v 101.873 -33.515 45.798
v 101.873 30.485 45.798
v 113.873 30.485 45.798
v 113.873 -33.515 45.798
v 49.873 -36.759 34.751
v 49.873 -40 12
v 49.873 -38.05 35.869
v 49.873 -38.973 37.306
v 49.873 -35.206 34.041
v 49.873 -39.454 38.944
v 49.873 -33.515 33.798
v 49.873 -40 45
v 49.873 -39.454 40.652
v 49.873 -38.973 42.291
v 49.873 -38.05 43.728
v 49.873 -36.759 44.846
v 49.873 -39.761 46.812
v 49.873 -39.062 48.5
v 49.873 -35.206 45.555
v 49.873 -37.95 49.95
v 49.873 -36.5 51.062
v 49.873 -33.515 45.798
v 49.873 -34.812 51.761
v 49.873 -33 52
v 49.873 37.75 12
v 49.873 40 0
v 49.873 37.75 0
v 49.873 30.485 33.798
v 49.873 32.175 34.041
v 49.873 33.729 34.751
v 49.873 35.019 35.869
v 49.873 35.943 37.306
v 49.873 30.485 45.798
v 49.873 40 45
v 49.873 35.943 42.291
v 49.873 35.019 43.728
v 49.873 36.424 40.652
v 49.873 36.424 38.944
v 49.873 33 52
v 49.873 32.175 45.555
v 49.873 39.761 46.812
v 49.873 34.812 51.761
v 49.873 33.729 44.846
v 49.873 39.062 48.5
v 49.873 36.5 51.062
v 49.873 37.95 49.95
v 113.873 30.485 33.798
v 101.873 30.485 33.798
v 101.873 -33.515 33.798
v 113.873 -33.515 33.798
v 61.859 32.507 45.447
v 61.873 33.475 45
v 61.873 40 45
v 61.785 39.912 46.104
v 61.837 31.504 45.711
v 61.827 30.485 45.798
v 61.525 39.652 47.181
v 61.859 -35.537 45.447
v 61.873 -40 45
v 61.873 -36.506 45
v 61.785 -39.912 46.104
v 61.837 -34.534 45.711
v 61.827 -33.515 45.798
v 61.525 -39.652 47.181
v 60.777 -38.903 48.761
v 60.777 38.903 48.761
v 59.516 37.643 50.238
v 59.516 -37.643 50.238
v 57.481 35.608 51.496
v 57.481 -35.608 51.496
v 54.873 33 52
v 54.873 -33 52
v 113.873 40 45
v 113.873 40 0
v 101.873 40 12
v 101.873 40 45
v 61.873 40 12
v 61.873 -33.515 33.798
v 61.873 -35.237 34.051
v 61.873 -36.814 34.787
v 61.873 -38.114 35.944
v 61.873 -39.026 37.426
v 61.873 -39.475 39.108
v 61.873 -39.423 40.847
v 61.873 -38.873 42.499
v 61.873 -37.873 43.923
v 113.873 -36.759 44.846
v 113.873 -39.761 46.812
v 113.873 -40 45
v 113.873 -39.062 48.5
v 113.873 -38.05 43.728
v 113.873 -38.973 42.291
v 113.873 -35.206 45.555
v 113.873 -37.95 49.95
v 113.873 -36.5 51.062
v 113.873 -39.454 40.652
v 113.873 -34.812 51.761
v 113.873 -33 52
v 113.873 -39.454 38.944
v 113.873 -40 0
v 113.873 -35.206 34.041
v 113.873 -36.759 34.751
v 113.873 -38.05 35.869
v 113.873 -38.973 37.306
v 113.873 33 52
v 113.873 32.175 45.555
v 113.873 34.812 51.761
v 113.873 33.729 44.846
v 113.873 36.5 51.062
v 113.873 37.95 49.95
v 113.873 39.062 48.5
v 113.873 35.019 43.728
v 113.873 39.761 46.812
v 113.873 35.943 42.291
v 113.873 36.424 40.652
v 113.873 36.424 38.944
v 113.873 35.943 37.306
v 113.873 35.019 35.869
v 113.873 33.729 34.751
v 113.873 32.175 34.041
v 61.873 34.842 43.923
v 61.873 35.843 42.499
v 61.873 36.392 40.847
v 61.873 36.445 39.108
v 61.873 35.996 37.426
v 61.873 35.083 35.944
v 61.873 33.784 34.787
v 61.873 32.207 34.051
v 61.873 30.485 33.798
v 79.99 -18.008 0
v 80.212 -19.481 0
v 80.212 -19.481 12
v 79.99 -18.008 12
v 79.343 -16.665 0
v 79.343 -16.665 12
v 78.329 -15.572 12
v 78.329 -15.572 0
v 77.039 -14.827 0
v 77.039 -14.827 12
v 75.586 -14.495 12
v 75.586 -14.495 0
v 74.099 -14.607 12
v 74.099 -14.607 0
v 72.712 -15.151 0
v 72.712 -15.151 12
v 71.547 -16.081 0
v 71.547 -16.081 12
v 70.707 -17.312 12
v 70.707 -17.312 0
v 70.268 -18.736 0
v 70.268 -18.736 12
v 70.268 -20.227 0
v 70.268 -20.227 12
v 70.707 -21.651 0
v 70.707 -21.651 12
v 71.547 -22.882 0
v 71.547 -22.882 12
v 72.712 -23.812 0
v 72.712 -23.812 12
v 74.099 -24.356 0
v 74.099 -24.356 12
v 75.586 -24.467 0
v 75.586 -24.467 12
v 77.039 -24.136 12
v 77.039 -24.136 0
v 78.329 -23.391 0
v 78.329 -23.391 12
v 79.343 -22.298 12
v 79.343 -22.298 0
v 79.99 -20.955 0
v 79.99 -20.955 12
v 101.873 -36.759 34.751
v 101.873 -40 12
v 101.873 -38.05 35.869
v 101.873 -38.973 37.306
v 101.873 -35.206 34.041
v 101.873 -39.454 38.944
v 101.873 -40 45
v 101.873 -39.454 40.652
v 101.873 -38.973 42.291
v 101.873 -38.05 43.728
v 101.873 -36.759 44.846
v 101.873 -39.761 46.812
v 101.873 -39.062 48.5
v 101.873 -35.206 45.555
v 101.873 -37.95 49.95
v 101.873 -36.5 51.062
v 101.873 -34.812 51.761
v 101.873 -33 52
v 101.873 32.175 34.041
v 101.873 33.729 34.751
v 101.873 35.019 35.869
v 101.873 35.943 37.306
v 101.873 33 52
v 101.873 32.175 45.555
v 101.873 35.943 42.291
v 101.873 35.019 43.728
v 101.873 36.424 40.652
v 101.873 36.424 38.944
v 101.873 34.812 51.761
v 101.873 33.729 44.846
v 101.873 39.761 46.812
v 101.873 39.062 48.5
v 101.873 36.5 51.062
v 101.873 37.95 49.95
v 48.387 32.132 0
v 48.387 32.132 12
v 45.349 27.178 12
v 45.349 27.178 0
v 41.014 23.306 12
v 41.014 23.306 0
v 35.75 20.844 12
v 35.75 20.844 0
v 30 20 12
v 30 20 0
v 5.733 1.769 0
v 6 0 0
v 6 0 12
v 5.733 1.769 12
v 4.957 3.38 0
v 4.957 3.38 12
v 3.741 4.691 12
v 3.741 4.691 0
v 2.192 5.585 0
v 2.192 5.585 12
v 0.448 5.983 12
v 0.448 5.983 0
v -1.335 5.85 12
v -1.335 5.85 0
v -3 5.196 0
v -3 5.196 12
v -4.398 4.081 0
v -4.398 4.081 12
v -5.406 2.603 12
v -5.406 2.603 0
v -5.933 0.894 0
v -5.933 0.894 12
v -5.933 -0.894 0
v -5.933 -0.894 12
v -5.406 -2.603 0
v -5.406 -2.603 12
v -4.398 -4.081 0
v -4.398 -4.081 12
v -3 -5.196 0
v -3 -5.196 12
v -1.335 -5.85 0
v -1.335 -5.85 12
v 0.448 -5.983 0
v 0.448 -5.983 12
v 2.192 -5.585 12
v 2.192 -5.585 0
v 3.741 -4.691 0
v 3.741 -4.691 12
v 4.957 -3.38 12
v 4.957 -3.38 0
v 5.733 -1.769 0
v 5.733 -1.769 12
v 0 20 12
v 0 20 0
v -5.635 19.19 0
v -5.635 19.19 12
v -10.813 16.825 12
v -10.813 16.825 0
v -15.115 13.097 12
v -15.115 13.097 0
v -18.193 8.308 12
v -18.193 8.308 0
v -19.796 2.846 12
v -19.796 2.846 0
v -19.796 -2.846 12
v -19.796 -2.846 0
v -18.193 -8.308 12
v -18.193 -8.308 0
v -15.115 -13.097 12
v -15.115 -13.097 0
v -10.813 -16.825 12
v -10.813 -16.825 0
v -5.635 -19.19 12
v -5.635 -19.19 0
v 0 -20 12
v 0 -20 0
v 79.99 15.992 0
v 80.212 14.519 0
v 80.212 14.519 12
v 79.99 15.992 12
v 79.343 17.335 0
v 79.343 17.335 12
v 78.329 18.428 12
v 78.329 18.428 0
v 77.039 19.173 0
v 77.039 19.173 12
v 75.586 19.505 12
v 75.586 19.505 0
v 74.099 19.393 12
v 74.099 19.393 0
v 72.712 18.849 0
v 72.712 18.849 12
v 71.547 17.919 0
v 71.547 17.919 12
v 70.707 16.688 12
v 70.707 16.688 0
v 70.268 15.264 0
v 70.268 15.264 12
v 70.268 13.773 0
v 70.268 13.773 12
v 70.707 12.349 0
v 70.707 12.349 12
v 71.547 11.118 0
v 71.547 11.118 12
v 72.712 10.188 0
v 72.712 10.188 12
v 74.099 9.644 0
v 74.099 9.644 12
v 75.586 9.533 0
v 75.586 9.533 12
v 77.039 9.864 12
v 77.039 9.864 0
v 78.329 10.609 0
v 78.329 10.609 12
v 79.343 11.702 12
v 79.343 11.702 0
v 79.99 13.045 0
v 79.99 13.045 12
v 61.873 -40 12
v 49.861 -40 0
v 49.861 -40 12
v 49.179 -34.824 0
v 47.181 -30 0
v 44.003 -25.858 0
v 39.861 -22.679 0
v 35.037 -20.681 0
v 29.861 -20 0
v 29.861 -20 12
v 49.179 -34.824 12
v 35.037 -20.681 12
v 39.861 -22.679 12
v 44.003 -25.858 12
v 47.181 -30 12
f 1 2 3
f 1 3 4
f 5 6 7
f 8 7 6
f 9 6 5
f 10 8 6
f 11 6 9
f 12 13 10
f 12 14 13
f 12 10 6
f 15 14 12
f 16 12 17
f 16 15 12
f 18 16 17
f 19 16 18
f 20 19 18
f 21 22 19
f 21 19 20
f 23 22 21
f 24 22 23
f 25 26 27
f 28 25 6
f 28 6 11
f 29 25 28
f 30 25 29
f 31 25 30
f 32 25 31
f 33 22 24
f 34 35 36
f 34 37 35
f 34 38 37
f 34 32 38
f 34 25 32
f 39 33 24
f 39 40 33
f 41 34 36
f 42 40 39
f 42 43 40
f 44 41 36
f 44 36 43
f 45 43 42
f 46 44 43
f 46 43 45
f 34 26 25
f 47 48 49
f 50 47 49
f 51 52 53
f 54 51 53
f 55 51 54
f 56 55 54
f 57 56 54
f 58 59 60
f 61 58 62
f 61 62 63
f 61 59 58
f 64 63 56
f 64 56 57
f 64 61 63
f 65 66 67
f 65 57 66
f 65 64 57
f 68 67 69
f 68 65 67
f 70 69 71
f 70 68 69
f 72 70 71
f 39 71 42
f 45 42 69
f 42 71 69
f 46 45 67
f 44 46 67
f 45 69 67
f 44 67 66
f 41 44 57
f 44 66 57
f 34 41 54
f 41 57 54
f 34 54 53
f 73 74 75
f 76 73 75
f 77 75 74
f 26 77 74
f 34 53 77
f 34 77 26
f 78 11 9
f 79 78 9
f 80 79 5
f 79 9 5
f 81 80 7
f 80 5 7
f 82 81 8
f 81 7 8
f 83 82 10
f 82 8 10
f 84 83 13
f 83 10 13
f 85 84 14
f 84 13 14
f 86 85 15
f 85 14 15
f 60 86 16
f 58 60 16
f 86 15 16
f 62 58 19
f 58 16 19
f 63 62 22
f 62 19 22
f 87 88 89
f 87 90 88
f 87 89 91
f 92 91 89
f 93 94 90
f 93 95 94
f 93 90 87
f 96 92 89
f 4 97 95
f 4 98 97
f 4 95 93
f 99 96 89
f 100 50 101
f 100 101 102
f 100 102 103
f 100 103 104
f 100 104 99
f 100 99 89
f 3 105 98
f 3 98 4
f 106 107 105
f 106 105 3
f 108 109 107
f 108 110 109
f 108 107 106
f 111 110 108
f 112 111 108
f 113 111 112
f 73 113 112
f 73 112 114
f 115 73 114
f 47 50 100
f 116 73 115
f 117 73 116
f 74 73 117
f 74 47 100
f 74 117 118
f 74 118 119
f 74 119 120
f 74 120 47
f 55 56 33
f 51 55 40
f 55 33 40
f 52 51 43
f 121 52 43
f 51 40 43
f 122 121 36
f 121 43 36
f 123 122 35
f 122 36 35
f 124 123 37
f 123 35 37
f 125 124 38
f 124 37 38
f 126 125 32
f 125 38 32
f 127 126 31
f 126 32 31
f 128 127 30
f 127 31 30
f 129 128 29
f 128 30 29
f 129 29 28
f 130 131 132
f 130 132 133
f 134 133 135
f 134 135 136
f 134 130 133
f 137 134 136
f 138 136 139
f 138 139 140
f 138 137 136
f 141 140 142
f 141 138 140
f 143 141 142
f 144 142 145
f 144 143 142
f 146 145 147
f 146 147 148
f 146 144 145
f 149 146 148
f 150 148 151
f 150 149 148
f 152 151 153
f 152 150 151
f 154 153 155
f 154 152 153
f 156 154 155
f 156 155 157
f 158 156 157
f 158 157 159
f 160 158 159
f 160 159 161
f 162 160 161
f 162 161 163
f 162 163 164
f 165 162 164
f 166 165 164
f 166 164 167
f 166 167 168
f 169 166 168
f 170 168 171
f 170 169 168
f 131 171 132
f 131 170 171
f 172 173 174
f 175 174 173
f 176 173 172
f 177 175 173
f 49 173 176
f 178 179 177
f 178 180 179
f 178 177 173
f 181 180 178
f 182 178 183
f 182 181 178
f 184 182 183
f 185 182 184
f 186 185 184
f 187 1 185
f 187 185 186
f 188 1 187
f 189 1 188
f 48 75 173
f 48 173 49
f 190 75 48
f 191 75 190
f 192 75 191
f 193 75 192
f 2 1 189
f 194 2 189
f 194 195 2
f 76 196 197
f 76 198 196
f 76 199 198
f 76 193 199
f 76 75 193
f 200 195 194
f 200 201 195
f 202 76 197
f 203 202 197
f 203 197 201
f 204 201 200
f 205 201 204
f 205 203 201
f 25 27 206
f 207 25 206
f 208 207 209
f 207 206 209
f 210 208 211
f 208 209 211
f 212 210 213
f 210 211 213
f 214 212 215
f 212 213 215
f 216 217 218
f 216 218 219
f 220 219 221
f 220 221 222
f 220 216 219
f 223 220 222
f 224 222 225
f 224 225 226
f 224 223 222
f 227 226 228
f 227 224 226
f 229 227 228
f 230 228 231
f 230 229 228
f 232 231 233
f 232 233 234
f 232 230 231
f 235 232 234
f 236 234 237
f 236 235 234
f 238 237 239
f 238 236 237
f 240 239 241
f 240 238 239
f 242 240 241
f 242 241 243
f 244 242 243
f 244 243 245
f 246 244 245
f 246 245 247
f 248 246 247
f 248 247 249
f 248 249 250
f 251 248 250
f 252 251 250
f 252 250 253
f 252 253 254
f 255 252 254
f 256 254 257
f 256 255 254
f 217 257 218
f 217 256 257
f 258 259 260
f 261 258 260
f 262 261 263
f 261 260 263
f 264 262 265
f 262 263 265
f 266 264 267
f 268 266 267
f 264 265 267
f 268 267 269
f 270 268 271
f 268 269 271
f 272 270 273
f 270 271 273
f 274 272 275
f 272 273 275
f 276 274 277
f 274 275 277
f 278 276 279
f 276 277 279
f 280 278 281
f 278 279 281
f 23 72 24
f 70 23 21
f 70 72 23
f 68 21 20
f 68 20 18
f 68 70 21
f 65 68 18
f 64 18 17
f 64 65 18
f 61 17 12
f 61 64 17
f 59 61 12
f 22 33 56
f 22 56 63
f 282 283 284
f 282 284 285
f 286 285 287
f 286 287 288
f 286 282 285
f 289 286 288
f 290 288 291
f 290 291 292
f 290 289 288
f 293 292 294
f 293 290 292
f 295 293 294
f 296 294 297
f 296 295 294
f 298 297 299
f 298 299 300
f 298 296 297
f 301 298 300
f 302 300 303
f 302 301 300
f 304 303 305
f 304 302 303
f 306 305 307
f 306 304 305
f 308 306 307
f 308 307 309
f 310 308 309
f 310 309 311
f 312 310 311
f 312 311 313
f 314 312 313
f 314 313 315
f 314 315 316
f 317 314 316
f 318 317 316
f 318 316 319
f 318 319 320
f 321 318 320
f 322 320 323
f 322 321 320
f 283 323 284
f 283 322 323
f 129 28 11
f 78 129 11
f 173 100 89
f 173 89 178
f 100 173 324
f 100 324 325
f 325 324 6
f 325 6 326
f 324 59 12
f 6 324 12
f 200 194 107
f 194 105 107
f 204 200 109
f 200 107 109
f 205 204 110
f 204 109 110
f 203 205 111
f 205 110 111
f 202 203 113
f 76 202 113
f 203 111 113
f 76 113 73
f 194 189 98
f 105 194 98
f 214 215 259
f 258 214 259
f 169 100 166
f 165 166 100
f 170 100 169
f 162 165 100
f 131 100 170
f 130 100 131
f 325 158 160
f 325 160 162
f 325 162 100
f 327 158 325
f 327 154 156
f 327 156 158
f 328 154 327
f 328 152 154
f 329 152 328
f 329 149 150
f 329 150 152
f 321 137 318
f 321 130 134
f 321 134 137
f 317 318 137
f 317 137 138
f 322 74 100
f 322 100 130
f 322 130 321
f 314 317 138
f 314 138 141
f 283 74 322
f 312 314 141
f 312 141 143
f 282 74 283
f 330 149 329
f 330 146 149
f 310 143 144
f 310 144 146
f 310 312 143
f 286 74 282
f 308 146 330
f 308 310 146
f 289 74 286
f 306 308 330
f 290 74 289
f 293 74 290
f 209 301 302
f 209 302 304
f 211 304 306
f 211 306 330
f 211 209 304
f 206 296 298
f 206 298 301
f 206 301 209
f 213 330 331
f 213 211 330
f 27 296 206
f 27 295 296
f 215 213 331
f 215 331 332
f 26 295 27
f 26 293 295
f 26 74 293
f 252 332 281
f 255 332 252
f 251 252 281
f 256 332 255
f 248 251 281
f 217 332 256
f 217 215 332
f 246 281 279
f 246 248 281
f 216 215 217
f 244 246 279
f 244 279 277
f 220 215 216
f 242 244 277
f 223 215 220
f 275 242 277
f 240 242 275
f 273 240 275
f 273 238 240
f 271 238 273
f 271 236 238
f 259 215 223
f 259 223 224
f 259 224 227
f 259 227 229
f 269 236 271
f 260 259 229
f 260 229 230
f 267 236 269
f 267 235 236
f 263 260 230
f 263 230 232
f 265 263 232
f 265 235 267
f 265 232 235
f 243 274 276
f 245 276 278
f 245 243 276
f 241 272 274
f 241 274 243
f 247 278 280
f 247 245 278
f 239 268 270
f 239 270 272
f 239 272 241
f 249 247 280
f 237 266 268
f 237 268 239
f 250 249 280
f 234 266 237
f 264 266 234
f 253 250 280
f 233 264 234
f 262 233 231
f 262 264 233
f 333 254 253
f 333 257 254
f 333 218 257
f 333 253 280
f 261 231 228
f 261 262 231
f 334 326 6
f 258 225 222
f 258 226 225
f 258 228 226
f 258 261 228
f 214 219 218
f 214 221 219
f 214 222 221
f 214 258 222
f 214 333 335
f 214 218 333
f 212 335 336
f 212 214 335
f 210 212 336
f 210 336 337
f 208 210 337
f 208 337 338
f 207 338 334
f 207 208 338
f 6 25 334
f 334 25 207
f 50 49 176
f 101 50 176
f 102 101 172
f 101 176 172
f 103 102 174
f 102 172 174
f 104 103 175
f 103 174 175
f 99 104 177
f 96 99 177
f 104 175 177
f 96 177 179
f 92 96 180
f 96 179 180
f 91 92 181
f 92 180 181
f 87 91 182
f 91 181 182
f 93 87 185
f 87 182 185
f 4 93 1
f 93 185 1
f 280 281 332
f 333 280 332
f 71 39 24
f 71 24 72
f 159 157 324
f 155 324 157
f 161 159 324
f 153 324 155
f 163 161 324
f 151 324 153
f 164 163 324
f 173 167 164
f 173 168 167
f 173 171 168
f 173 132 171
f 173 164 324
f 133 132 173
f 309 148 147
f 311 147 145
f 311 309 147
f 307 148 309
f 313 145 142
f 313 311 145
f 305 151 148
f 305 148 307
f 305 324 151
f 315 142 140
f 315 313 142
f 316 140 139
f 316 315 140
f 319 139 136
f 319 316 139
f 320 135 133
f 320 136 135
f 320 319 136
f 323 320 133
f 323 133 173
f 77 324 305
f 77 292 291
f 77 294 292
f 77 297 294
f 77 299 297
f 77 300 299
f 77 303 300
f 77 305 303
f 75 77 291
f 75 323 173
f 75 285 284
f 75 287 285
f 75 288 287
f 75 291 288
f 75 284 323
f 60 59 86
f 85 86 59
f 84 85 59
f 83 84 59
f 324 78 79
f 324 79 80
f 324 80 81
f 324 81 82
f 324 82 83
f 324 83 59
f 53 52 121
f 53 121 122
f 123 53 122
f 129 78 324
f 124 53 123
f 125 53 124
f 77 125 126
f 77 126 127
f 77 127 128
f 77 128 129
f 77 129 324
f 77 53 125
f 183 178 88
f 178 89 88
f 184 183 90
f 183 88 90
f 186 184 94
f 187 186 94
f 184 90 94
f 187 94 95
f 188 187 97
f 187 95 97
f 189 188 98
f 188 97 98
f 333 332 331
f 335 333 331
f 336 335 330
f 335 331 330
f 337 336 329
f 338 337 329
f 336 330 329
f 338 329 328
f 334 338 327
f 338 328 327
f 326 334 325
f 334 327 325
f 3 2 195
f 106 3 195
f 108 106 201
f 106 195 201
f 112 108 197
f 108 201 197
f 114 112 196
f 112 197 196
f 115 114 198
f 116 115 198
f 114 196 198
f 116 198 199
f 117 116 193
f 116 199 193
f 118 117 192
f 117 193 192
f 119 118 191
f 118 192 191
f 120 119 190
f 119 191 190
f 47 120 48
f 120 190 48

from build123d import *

# Parameters (mm, degrees)
F0_R     = 5
F0_R_2   = 6
F1_DEPTH = 12
F3_DEPTH = 80
F4_R     = 7
F5_W     = 64
F5_H     = 12
F6_DEPTH = 77.1


with BuildPart() as f1:
    # F0 (on Top) → F1 (new body)
    with BuildSketch(Plane.XY):
        with BuildLine():
            Line((29.965228, 20), (0, 20))
            ThreePointArc((0, 20), (-20, 0), (0, -20))
            Line((0, -20), (29.860913, -20))
            ThreePointArc((29.860913, -20), (44.003049, -25.857864), (49.860913, -40))
            Line((49.860913, -40), (102, -40))
            Line((102, -40), (102, -33))
            Line((102, -33), (113.873083, -33))
            Line((113.873083, -33), (113.873083, 33))
            Line((113.873083, 33), (102, 33))
            Line((102, 33), (102, 40))
            Line((102, 40), (50, 40))
            ThreePointArc((50, 40), (44.142136, 25.857864), (30, 20))
            Line((30, 20), (29.965228, 20))
        make_face()
        with Locations((75.211979, -19.481467)):
            Circle(F0_R, mode=Mode.SUBTRACT)
        Circle(F0_R_2, mode=Mode.SUBTRACT)
        with Locations((75.211979, 14.518533)):
            Circle(F0_R, mode=Mode.SUBTRACT)
    extrude(amount=F1_DEPTH)

    # F2 (on face) → F3 (join)
    with BuildSketch(Plane(origin=(0, 40, 0), x_dir=(-1, 0, 0), z_dir=(0, 1, 0))):
        Polygon((-113.873083, 52), (-113.873083, 0), (-102, 0), (-102, 12), (-101.873083, 12), (-101.873083, 52), align=None)
        Polygon((-61.873083, 52), (-61.873083, 12), (-50, 12), (-50, 0), (-49.873083, 0), (-49.873083, 52), align=None)
    extrude(amount=-F3_DEPTH)

    # F4
    f4_edges = [f1.edges().sort_by_distance(p)[0] for p in [
        (107.873083, 40, 52),
        (55.873083, 40, 52),
        (55.873083, -40, 52),
        (107.873083, -40, 52),
        (61.873083, 0, 52),
    ]]
    fillet(f4_edges, radius=F4_R)

    # F5 (on face) → F6 (cut)
    with BuildSketch(Plane(origin=(49.873083, 0, 0), x_dir=(0, -1, 0), z_dir=(-1, 0, 0))):
        with Locations((1.51522, 39.79838)):
            Rectangle(F5_W, F5_H)
        with BuildLine():
            Line((-30.48478, 33.79838), (-30.48478, 45.79838))
            ThreePointArc((-30.48478, 45.79838), (-36.48478, 39.79838), (-30.48478, 33.79838))
        make_face()
        with BuildLine():
            ThreePointArc((33.51522, 33.79838), (39.51522, 39.79838), (33.51522, 45.79838))
            Line((33.51522, 45.79838), (33.51522, 33.79838))
        make_face()
    extrude(amount=-F6_DEPTH, mode=Mode.SUBTRACT)


solid = f1.part
